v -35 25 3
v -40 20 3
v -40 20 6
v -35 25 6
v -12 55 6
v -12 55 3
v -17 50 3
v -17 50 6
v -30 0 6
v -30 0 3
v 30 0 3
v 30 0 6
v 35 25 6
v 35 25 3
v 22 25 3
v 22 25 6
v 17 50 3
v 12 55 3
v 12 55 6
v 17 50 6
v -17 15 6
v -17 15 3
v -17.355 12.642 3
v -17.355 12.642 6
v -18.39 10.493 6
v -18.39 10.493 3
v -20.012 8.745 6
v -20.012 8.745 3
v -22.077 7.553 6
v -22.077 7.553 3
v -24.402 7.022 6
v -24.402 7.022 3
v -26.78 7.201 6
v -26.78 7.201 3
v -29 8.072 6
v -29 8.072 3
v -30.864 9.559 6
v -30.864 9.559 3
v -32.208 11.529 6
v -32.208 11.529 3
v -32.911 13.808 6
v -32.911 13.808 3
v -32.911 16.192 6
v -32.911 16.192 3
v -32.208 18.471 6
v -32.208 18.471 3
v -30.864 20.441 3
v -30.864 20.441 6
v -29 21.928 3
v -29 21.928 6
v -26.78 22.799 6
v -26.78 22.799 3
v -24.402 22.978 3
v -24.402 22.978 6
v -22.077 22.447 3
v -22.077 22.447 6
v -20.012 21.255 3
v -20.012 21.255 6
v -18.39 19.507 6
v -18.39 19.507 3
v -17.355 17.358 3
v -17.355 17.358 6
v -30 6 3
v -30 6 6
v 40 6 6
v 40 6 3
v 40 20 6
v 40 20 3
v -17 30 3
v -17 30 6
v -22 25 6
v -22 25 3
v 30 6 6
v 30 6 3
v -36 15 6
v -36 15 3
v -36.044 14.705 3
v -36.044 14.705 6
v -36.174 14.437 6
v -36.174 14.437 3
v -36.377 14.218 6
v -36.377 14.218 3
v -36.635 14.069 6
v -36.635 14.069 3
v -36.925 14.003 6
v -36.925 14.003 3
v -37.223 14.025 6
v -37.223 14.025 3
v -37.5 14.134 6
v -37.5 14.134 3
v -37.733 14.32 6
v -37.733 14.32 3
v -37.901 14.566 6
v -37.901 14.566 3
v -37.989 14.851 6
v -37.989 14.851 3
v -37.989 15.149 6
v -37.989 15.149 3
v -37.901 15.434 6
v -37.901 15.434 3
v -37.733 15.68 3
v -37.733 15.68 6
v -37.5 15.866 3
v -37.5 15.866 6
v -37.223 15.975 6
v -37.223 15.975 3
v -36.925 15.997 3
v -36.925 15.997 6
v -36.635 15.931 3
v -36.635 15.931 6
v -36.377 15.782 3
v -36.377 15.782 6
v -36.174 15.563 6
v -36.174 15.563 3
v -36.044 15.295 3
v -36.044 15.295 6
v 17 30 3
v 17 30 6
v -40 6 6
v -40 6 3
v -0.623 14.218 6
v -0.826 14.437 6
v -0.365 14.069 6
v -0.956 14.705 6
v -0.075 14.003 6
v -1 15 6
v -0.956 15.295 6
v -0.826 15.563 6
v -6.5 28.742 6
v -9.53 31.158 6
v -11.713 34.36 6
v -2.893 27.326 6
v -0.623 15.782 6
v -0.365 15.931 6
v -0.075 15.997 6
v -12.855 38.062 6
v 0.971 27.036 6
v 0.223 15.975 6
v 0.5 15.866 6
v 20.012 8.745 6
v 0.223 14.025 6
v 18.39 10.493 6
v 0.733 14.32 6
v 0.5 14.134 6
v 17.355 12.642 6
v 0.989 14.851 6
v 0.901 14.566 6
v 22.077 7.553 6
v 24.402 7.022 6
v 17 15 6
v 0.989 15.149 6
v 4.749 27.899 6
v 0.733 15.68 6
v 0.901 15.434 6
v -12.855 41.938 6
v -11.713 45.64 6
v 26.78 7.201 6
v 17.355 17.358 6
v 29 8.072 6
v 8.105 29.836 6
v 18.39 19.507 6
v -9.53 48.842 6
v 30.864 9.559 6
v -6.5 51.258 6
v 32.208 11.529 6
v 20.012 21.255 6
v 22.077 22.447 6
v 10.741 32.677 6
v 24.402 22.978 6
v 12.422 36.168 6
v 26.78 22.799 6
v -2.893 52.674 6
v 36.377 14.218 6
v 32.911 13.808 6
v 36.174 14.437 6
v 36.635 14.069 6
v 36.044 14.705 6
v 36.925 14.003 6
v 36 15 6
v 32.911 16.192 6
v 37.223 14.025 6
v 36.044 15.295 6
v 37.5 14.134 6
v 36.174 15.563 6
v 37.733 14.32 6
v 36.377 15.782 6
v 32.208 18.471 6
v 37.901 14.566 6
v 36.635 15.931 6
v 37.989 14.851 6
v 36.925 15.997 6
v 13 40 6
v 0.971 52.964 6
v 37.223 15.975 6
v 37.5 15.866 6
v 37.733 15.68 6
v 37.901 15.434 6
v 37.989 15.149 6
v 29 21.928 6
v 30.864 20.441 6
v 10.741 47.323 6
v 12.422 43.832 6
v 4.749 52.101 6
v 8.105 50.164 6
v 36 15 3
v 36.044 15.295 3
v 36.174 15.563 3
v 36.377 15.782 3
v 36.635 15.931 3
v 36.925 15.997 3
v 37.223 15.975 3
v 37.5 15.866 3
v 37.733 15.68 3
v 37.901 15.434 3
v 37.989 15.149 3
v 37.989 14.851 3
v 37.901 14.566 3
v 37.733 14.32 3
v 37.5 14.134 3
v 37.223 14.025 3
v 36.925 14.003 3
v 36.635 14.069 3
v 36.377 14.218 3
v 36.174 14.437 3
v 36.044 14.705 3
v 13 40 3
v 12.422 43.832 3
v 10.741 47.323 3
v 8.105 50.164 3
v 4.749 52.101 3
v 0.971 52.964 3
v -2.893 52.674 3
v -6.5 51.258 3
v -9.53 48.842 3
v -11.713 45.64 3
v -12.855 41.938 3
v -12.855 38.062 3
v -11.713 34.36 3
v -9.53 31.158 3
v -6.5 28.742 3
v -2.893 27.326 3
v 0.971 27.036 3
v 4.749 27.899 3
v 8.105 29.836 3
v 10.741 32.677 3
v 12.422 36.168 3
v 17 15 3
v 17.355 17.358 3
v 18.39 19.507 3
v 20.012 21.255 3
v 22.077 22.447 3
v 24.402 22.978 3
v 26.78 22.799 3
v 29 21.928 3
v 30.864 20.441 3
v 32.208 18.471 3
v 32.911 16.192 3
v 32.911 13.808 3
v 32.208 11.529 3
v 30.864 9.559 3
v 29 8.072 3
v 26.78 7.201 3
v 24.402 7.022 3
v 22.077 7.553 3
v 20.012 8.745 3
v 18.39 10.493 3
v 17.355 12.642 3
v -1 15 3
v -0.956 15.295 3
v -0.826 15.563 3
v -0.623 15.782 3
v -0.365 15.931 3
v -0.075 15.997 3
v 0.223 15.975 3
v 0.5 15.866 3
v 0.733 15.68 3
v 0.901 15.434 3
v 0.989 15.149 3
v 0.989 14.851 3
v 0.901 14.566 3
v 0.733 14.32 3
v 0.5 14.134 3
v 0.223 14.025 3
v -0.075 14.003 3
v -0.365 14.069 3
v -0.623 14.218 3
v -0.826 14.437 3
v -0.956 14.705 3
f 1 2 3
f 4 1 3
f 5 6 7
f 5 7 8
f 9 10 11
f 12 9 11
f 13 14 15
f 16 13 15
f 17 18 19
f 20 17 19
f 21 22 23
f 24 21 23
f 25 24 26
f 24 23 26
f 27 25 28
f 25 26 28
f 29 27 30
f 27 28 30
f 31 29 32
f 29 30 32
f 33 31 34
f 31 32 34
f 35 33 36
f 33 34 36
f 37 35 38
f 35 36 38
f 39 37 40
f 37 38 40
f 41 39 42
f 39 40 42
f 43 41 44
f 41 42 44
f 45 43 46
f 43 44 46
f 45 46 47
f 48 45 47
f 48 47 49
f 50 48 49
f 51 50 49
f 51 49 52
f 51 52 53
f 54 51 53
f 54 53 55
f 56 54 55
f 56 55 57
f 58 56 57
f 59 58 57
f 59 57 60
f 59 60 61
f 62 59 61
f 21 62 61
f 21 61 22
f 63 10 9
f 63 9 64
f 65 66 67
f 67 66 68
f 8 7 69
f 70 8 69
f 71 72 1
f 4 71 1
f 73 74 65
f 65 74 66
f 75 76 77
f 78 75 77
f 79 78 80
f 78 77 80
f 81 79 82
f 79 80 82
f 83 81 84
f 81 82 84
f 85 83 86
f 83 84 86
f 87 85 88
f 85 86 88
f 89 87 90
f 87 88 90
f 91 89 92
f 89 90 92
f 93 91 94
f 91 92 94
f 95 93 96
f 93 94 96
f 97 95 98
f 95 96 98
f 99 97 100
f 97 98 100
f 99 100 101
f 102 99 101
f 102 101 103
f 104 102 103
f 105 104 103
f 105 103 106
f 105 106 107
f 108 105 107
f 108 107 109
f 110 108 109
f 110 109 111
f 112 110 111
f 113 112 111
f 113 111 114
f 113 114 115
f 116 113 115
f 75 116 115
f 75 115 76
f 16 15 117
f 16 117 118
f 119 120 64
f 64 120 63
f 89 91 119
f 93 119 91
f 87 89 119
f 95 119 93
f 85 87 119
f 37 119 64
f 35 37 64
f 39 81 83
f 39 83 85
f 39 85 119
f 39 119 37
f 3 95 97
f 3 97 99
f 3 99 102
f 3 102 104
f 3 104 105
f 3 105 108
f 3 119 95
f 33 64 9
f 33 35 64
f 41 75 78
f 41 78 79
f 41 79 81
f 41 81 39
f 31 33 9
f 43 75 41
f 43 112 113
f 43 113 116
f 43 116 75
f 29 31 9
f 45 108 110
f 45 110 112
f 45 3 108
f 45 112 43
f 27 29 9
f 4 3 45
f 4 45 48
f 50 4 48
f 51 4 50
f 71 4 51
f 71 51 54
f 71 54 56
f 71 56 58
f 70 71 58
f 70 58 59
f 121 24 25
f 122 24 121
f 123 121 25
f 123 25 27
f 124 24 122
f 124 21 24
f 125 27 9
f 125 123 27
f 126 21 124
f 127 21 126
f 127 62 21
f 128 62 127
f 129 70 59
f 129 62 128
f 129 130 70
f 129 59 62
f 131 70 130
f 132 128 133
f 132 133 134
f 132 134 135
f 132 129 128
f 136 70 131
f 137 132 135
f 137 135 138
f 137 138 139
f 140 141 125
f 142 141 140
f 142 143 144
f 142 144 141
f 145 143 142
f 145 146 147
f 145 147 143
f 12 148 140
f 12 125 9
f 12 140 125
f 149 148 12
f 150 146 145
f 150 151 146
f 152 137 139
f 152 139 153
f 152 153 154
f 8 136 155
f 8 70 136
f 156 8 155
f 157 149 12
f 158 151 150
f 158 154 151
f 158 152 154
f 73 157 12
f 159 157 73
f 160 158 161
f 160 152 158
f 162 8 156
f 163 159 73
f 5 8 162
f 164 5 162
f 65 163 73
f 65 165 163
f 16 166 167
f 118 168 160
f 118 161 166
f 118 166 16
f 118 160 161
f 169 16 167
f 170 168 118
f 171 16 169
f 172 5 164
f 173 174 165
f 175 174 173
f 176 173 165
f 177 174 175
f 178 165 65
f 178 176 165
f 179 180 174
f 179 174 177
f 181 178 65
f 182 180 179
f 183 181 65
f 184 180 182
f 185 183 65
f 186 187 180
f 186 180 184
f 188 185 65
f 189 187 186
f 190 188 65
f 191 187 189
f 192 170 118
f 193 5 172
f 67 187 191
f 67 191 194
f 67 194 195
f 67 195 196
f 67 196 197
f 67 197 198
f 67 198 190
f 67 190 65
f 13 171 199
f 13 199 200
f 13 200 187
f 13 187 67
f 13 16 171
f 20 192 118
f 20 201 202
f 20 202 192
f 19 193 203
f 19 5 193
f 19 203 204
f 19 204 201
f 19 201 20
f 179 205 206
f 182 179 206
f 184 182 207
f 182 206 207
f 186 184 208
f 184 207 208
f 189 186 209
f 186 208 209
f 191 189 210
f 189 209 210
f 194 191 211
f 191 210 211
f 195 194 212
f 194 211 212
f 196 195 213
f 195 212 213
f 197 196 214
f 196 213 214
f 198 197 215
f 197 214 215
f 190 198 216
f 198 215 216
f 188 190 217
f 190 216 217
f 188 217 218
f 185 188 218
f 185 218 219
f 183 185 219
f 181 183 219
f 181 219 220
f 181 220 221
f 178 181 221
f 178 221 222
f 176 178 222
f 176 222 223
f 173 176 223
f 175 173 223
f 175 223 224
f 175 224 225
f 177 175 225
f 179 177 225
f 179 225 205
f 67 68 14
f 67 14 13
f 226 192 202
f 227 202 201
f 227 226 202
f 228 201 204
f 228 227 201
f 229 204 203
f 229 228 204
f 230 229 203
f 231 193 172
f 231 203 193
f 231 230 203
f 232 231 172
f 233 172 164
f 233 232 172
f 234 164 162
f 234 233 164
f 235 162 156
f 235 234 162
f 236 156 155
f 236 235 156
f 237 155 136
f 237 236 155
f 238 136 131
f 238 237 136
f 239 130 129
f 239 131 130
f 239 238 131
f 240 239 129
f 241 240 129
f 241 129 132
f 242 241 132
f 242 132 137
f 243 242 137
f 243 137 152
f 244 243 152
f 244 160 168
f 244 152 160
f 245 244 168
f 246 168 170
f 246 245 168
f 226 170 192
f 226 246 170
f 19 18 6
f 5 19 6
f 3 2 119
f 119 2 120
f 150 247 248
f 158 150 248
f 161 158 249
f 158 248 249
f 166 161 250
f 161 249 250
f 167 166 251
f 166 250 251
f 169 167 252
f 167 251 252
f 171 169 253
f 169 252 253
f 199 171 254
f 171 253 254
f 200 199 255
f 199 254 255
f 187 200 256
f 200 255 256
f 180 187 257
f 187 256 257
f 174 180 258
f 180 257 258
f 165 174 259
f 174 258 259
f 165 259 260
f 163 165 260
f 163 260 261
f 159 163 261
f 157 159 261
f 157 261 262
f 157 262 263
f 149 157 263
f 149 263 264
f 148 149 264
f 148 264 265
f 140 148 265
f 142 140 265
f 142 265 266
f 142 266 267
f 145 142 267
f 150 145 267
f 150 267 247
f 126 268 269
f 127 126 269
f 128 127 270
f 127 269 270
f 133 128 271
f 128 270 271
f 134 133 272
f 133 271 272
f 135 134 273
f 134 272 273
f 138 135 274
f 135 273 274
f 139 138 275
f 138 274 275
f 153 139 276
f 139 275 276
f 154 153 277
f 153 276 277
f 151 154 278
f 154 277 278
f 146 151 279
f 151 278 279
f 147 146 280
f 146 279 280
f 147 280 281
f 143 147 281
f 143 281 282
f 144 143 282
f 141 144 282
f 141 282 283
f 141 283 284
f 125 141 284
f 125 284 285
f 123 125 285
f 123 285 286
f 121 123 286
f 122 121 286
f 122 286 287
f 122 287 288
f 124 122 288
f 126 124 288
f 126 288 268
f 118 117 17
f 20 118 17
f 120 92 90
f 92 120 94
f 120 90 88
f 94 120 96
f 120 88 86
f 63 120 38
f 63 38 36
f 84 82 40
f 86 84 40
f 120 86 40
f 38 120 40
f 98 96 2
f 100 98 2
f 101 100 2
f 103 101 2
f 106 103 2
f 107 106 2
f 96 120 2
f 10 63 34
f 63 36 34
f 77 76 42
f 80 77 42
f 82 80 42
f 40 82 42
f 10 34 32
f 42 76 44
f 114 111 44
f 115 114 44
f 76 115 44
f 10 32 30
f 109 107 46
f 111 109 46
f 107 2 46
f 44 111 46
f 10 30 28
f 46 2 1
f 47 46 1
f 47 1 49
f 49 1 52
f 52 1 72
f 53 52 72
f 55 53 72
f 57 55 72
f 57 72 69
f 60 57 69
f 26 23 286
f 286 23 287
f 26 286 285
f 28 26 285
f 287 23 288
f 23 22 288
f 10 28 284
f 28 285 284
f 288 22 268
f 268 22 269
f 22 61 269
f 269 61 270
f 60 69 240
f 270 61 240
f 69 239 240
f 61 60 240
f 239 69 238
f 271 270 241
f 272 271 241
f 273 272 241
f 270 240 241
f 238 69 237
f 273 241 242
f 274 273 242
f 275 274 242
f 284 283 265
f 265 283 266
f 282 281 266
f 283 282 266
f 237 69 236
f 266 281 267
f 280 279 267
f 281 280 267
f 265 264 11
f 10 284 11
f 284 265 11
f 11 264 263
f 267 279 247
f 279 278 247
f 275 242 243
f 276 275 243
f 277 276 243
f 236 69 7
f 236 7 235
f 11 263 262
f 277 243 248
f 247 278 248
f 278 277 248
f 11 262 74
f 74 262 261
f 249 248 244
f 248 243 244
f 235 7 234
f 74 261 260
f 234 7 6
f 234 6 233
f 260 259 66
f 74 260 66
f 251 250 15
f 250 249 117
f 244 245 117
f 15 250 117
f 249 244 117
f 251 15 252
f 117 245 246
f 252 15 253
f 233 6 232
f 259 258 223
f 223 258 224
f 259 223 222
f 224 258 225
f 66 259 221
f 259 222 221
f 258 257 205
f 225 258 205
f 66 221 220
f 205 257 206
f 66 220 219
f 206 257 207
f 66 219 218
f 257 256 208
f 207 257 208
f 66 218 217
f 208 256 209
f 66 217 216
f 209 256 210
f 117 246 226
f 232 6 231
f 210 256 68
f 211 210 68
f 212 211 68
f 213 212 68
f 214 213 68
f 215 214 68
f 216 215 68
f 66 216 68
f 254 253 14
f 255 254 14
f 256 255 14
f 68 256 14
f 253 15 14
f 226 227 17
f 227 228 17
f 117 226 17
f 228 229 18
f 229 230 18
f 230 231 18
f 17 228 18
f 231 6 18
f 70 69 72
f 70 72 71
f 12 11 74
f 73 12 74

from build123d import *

# Parameters (mm, degrees)
ESQUISSE1_R             = 13
BOSS_EXTRU_1_DEPTH      = 12
BOSS_EXTRU_2_START      = -12
ESQUISSE2_R             = 13
ESQUISSE2_R_2           = 5.5
BOSS_EXTRU_2_DEPTH      = 3
ESQUISSE4_R             = 8
ENL_V_MAT_EXTRU_2_DEPTH = 6
ESQUISSE5_R             = 3
ENL_V_MAT_EXTRU_3_DEPTH = 69.271516755
ENL_V_START             = -12
ESQUISSE6_W             = 10
ESQUISSE6_H             = 6
ENL_V_MAT_EXTRU_4_DEPTH = 12
CHANFREIN1_SIZE         = 5
ESQUISSE7_R             = 1
ENL_V_MAT_EXTRU_5_DEPTH = 12
ESQUISSE8_W             = 80
ESQUISSE8_H             = 3
ESQUISSE8_H_2           = 6
ENL_V_MAT_EXTRU_6_DEPTH = 70.057946682


with BuildPart() as part:
    # Esquisse1 → Boss.-Extru.1 (new body)
    with BuildSketch(Plane.XY):
        Polygon((-40, 0), (40, 0), (40, 25), (17, 25), (17, 55), (-17, 55), (-17, 25), (-40, 25), align=None)
        with Locations((0, 40)):
            Circle(ESQUISSE1_R, mode=Mode.SUBTRACT)
    extrude(amount=BOSS_EXTRU_1_DEPTH)

    # Esquisse2 → Boss.-Extru.2 (add)
    with BuildSketch(Plane.XY.offset(12).offset(BOSS_EXTRU_2_START)):
        with Locations((0, 40)):
            Circle(ESQUISSE2_R)
        with Locations((0, 40)):
            Circle(ESQUISSE2_R_2, mode=Mode.SUBTRACT)
    extrude(amount=BOSS_EXTRU_2_DEPTH)

    # Esquisse4 → Enlèv. mat.-Extru.2 (cut)
    with BuildSketch(Plane(origin=(0, 0, 0), x_dir=(-1, 0, 0), z_dir=(0, 0, -1))):
        with Locations((-25, 15)):
            Circle(ESQUISSE4_R)
        with Locations(Location((25, 15, 0), (0, 0, 180))):
            Circle(ESQUISSE4_R)
    extrude(amount=-ENL_V_MAT_EXTRU_2_DEPTH, mode=Mode.SUBTRACT)

    # Esquisse5 → Enlèv. mat.-Extru.3 (cut, through all)
    with BuildSketch(Plane(origin=(0, 0, 6), x_dir=(-1, 0, 0), z_dir=(0, 0, -1))):
        with Locations((-25, 15)):
            Circle(ESQUISSE5_R)
        with Locations(Location((25, 15, 0), (0, 0, 180))):
            Circle(ESQUISSE5_R)
    extrude(amount=-ENL_V_MAT_EXTRU_3_DEPTH, mode=Mode.SUBTRACT)

    # Esquisse6 → Enlèv. mat.-Extru.4 (cut)
    with BuildSketch(Plane.XY.offset(12).offset(ENL_V_START)):
        with Locations((35, 3)):
            Rectangle(ESQUISSE6_W, ESQUISSE6_H)
        with Locations((-35, 3)):
            Rectangle(ESQUISSE6_W, ESQUISSE6_H)
    extrude(amount=ENL_V_MAT_EXTRU_4_DEPTH, mode=Mode.SUBTRACT)

    # Chanfrein1
    chanfrein1_edges = [part.edges().sort_by_distance(p)[0] for p in [
        (-17, 55, 6),
        (17, 55, 6),
        (17, 25, 6),
        (40, 25, 6),
        (-40, 25, 6),
        (-17, 25, 6),
    ]]
    chamfer(chanfrein1_edges, length=CHANFREIN1_SIZE)

    # Esquisse7 → Enlèv. mat.-Extru.5 (cut)
    with BuildSketch(Plane(origin=(0, 0, 0), x_dir=(-1, 0, 0), z_dir=(0, 0, -1))):
        with Locations((-10, 45)):
            Circle(ESQUISSE7_R)
        with Locations(Location((10, 45, 0), (0, 0, 180))):
            Circle(ESQUISSE7_R)
        with Locations((-37, 15)):
            Circle(ESQUISSE7_R)
        with Locations(Location((37, 15, 0), (0, 0, 180))):
            Circle(ESQUISSE7_R)
        with Locations((0, 15)):
            Circle(ESQUISSE7_R)
    extrude(amount=-ENL_V_MAT_EXTRU_5_DEPTH, mode=Mode.SUBTRACT)

    # Esquisse8 → Enlèv. mat.-Extru.6 (cut, through all)
    with BuildSketch(Plane(origin=(0, 55, 0), x_dir=(1, 0, 0), z_dir=(0, 1, 0))):
        with Locations((0, -1.5)):
            Rectangle(ESQUISSE8_W, ESQUISSE8_H)
        with Locations((0, -9)):
            Rectangle(ESQUISSE8_W, ESQUISSE8_H_2)
    extrude(amount=-ENL_V_MAT_EXTRU_6_DEPTH, mode=Mode.SUBTRACT)


solid = part.part
